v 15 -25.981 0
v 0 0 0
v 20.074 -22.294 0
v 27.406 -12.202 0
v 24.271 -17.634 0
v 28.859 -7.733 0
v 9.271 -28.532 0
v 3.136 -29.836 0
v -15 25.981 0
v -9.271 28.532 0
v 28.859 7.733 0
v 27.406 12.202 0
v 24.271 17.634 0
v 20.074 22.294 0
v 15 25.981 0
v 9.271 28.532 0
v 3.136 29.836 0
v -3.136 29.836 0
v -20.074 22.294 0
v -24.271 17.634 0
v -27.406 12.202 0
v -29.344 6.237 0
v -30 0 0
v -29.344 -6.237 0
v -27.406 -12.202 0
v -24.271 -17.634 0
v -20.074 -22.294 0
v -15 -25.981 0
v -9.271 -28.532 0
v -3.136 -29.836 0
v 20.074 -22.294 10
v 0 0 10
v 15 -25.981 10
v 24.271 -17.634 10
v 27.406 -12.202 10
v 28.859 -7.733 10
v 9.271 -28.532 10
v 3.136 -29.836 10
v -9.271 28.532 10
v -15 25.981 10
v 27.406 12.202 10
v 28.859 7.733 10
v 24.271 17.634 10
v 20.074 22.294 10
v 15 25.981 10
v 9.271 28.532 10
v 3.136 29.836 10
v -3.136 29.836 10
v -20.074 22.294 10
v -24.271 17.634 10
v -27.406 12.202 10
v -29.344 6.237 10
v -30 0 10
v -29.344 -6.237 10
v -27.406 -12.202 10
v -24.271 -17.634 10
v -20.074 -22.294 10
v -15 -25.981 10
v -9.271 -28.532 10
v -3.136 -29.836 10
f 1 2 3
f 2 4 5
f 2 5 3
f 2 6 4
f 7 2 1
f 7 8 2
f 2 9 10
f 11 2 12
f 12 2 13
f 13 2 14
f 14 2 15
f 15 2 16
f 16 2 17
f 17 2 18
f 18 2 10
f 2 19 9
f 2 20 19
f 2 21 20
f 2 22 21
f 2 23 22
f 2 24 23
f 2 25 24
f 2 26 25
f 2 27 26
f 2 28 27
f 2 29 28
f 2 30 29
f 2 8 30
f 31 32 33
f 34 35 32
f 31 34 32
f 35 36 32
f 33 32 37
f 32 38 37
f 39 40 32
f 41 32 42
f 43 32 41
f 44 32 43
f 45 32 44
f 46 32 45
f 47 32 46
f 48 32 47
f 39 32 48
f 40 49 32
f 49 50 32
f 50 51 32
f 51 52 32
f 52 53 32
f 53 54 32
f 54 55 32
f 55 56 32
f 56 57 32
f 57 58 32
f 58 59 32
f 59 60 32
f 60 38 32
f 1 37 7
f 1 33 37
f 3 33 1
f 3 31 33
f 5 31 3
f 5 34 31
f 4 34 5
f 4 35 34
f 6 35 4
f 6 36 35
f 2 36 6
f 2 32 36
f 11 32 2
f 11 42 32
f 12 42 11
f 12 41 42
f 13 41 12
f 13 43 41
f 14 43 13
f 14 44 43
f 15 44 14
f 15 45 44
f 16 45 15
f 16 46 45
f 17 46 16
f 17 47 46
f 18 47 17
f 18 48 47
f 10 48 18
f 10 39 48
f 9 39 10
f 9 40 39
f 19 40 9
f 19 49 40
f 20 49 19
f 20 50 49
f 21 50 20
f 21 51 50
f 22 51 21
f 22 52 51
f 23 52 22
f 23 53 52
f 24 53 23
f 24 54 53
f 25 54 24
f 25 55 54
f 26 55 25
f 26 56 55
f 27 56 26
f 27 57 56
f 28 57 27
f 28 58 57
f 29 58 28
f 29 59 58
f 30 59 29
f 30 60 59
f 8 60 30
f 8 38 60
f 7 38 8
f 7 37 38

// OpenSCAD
// Unit of length: Unit.INCH
linear_extrude(height = 10.0, center = false, convexity = 2, twist = 0.0, scale = 1.0)
{
   intersection()
   {
      circle(r = 30.0, $fa = 12.0, $fs = 2.0, $fn = 0);
      polygon(points = [[0.0, 0.0], [33.4718, 8.9687], [0.0, 42.4405], [-42.4405, 0.0], [0.0, -42.4405], [33.4718, -8.9687]], convexity = 2);
   }
}
